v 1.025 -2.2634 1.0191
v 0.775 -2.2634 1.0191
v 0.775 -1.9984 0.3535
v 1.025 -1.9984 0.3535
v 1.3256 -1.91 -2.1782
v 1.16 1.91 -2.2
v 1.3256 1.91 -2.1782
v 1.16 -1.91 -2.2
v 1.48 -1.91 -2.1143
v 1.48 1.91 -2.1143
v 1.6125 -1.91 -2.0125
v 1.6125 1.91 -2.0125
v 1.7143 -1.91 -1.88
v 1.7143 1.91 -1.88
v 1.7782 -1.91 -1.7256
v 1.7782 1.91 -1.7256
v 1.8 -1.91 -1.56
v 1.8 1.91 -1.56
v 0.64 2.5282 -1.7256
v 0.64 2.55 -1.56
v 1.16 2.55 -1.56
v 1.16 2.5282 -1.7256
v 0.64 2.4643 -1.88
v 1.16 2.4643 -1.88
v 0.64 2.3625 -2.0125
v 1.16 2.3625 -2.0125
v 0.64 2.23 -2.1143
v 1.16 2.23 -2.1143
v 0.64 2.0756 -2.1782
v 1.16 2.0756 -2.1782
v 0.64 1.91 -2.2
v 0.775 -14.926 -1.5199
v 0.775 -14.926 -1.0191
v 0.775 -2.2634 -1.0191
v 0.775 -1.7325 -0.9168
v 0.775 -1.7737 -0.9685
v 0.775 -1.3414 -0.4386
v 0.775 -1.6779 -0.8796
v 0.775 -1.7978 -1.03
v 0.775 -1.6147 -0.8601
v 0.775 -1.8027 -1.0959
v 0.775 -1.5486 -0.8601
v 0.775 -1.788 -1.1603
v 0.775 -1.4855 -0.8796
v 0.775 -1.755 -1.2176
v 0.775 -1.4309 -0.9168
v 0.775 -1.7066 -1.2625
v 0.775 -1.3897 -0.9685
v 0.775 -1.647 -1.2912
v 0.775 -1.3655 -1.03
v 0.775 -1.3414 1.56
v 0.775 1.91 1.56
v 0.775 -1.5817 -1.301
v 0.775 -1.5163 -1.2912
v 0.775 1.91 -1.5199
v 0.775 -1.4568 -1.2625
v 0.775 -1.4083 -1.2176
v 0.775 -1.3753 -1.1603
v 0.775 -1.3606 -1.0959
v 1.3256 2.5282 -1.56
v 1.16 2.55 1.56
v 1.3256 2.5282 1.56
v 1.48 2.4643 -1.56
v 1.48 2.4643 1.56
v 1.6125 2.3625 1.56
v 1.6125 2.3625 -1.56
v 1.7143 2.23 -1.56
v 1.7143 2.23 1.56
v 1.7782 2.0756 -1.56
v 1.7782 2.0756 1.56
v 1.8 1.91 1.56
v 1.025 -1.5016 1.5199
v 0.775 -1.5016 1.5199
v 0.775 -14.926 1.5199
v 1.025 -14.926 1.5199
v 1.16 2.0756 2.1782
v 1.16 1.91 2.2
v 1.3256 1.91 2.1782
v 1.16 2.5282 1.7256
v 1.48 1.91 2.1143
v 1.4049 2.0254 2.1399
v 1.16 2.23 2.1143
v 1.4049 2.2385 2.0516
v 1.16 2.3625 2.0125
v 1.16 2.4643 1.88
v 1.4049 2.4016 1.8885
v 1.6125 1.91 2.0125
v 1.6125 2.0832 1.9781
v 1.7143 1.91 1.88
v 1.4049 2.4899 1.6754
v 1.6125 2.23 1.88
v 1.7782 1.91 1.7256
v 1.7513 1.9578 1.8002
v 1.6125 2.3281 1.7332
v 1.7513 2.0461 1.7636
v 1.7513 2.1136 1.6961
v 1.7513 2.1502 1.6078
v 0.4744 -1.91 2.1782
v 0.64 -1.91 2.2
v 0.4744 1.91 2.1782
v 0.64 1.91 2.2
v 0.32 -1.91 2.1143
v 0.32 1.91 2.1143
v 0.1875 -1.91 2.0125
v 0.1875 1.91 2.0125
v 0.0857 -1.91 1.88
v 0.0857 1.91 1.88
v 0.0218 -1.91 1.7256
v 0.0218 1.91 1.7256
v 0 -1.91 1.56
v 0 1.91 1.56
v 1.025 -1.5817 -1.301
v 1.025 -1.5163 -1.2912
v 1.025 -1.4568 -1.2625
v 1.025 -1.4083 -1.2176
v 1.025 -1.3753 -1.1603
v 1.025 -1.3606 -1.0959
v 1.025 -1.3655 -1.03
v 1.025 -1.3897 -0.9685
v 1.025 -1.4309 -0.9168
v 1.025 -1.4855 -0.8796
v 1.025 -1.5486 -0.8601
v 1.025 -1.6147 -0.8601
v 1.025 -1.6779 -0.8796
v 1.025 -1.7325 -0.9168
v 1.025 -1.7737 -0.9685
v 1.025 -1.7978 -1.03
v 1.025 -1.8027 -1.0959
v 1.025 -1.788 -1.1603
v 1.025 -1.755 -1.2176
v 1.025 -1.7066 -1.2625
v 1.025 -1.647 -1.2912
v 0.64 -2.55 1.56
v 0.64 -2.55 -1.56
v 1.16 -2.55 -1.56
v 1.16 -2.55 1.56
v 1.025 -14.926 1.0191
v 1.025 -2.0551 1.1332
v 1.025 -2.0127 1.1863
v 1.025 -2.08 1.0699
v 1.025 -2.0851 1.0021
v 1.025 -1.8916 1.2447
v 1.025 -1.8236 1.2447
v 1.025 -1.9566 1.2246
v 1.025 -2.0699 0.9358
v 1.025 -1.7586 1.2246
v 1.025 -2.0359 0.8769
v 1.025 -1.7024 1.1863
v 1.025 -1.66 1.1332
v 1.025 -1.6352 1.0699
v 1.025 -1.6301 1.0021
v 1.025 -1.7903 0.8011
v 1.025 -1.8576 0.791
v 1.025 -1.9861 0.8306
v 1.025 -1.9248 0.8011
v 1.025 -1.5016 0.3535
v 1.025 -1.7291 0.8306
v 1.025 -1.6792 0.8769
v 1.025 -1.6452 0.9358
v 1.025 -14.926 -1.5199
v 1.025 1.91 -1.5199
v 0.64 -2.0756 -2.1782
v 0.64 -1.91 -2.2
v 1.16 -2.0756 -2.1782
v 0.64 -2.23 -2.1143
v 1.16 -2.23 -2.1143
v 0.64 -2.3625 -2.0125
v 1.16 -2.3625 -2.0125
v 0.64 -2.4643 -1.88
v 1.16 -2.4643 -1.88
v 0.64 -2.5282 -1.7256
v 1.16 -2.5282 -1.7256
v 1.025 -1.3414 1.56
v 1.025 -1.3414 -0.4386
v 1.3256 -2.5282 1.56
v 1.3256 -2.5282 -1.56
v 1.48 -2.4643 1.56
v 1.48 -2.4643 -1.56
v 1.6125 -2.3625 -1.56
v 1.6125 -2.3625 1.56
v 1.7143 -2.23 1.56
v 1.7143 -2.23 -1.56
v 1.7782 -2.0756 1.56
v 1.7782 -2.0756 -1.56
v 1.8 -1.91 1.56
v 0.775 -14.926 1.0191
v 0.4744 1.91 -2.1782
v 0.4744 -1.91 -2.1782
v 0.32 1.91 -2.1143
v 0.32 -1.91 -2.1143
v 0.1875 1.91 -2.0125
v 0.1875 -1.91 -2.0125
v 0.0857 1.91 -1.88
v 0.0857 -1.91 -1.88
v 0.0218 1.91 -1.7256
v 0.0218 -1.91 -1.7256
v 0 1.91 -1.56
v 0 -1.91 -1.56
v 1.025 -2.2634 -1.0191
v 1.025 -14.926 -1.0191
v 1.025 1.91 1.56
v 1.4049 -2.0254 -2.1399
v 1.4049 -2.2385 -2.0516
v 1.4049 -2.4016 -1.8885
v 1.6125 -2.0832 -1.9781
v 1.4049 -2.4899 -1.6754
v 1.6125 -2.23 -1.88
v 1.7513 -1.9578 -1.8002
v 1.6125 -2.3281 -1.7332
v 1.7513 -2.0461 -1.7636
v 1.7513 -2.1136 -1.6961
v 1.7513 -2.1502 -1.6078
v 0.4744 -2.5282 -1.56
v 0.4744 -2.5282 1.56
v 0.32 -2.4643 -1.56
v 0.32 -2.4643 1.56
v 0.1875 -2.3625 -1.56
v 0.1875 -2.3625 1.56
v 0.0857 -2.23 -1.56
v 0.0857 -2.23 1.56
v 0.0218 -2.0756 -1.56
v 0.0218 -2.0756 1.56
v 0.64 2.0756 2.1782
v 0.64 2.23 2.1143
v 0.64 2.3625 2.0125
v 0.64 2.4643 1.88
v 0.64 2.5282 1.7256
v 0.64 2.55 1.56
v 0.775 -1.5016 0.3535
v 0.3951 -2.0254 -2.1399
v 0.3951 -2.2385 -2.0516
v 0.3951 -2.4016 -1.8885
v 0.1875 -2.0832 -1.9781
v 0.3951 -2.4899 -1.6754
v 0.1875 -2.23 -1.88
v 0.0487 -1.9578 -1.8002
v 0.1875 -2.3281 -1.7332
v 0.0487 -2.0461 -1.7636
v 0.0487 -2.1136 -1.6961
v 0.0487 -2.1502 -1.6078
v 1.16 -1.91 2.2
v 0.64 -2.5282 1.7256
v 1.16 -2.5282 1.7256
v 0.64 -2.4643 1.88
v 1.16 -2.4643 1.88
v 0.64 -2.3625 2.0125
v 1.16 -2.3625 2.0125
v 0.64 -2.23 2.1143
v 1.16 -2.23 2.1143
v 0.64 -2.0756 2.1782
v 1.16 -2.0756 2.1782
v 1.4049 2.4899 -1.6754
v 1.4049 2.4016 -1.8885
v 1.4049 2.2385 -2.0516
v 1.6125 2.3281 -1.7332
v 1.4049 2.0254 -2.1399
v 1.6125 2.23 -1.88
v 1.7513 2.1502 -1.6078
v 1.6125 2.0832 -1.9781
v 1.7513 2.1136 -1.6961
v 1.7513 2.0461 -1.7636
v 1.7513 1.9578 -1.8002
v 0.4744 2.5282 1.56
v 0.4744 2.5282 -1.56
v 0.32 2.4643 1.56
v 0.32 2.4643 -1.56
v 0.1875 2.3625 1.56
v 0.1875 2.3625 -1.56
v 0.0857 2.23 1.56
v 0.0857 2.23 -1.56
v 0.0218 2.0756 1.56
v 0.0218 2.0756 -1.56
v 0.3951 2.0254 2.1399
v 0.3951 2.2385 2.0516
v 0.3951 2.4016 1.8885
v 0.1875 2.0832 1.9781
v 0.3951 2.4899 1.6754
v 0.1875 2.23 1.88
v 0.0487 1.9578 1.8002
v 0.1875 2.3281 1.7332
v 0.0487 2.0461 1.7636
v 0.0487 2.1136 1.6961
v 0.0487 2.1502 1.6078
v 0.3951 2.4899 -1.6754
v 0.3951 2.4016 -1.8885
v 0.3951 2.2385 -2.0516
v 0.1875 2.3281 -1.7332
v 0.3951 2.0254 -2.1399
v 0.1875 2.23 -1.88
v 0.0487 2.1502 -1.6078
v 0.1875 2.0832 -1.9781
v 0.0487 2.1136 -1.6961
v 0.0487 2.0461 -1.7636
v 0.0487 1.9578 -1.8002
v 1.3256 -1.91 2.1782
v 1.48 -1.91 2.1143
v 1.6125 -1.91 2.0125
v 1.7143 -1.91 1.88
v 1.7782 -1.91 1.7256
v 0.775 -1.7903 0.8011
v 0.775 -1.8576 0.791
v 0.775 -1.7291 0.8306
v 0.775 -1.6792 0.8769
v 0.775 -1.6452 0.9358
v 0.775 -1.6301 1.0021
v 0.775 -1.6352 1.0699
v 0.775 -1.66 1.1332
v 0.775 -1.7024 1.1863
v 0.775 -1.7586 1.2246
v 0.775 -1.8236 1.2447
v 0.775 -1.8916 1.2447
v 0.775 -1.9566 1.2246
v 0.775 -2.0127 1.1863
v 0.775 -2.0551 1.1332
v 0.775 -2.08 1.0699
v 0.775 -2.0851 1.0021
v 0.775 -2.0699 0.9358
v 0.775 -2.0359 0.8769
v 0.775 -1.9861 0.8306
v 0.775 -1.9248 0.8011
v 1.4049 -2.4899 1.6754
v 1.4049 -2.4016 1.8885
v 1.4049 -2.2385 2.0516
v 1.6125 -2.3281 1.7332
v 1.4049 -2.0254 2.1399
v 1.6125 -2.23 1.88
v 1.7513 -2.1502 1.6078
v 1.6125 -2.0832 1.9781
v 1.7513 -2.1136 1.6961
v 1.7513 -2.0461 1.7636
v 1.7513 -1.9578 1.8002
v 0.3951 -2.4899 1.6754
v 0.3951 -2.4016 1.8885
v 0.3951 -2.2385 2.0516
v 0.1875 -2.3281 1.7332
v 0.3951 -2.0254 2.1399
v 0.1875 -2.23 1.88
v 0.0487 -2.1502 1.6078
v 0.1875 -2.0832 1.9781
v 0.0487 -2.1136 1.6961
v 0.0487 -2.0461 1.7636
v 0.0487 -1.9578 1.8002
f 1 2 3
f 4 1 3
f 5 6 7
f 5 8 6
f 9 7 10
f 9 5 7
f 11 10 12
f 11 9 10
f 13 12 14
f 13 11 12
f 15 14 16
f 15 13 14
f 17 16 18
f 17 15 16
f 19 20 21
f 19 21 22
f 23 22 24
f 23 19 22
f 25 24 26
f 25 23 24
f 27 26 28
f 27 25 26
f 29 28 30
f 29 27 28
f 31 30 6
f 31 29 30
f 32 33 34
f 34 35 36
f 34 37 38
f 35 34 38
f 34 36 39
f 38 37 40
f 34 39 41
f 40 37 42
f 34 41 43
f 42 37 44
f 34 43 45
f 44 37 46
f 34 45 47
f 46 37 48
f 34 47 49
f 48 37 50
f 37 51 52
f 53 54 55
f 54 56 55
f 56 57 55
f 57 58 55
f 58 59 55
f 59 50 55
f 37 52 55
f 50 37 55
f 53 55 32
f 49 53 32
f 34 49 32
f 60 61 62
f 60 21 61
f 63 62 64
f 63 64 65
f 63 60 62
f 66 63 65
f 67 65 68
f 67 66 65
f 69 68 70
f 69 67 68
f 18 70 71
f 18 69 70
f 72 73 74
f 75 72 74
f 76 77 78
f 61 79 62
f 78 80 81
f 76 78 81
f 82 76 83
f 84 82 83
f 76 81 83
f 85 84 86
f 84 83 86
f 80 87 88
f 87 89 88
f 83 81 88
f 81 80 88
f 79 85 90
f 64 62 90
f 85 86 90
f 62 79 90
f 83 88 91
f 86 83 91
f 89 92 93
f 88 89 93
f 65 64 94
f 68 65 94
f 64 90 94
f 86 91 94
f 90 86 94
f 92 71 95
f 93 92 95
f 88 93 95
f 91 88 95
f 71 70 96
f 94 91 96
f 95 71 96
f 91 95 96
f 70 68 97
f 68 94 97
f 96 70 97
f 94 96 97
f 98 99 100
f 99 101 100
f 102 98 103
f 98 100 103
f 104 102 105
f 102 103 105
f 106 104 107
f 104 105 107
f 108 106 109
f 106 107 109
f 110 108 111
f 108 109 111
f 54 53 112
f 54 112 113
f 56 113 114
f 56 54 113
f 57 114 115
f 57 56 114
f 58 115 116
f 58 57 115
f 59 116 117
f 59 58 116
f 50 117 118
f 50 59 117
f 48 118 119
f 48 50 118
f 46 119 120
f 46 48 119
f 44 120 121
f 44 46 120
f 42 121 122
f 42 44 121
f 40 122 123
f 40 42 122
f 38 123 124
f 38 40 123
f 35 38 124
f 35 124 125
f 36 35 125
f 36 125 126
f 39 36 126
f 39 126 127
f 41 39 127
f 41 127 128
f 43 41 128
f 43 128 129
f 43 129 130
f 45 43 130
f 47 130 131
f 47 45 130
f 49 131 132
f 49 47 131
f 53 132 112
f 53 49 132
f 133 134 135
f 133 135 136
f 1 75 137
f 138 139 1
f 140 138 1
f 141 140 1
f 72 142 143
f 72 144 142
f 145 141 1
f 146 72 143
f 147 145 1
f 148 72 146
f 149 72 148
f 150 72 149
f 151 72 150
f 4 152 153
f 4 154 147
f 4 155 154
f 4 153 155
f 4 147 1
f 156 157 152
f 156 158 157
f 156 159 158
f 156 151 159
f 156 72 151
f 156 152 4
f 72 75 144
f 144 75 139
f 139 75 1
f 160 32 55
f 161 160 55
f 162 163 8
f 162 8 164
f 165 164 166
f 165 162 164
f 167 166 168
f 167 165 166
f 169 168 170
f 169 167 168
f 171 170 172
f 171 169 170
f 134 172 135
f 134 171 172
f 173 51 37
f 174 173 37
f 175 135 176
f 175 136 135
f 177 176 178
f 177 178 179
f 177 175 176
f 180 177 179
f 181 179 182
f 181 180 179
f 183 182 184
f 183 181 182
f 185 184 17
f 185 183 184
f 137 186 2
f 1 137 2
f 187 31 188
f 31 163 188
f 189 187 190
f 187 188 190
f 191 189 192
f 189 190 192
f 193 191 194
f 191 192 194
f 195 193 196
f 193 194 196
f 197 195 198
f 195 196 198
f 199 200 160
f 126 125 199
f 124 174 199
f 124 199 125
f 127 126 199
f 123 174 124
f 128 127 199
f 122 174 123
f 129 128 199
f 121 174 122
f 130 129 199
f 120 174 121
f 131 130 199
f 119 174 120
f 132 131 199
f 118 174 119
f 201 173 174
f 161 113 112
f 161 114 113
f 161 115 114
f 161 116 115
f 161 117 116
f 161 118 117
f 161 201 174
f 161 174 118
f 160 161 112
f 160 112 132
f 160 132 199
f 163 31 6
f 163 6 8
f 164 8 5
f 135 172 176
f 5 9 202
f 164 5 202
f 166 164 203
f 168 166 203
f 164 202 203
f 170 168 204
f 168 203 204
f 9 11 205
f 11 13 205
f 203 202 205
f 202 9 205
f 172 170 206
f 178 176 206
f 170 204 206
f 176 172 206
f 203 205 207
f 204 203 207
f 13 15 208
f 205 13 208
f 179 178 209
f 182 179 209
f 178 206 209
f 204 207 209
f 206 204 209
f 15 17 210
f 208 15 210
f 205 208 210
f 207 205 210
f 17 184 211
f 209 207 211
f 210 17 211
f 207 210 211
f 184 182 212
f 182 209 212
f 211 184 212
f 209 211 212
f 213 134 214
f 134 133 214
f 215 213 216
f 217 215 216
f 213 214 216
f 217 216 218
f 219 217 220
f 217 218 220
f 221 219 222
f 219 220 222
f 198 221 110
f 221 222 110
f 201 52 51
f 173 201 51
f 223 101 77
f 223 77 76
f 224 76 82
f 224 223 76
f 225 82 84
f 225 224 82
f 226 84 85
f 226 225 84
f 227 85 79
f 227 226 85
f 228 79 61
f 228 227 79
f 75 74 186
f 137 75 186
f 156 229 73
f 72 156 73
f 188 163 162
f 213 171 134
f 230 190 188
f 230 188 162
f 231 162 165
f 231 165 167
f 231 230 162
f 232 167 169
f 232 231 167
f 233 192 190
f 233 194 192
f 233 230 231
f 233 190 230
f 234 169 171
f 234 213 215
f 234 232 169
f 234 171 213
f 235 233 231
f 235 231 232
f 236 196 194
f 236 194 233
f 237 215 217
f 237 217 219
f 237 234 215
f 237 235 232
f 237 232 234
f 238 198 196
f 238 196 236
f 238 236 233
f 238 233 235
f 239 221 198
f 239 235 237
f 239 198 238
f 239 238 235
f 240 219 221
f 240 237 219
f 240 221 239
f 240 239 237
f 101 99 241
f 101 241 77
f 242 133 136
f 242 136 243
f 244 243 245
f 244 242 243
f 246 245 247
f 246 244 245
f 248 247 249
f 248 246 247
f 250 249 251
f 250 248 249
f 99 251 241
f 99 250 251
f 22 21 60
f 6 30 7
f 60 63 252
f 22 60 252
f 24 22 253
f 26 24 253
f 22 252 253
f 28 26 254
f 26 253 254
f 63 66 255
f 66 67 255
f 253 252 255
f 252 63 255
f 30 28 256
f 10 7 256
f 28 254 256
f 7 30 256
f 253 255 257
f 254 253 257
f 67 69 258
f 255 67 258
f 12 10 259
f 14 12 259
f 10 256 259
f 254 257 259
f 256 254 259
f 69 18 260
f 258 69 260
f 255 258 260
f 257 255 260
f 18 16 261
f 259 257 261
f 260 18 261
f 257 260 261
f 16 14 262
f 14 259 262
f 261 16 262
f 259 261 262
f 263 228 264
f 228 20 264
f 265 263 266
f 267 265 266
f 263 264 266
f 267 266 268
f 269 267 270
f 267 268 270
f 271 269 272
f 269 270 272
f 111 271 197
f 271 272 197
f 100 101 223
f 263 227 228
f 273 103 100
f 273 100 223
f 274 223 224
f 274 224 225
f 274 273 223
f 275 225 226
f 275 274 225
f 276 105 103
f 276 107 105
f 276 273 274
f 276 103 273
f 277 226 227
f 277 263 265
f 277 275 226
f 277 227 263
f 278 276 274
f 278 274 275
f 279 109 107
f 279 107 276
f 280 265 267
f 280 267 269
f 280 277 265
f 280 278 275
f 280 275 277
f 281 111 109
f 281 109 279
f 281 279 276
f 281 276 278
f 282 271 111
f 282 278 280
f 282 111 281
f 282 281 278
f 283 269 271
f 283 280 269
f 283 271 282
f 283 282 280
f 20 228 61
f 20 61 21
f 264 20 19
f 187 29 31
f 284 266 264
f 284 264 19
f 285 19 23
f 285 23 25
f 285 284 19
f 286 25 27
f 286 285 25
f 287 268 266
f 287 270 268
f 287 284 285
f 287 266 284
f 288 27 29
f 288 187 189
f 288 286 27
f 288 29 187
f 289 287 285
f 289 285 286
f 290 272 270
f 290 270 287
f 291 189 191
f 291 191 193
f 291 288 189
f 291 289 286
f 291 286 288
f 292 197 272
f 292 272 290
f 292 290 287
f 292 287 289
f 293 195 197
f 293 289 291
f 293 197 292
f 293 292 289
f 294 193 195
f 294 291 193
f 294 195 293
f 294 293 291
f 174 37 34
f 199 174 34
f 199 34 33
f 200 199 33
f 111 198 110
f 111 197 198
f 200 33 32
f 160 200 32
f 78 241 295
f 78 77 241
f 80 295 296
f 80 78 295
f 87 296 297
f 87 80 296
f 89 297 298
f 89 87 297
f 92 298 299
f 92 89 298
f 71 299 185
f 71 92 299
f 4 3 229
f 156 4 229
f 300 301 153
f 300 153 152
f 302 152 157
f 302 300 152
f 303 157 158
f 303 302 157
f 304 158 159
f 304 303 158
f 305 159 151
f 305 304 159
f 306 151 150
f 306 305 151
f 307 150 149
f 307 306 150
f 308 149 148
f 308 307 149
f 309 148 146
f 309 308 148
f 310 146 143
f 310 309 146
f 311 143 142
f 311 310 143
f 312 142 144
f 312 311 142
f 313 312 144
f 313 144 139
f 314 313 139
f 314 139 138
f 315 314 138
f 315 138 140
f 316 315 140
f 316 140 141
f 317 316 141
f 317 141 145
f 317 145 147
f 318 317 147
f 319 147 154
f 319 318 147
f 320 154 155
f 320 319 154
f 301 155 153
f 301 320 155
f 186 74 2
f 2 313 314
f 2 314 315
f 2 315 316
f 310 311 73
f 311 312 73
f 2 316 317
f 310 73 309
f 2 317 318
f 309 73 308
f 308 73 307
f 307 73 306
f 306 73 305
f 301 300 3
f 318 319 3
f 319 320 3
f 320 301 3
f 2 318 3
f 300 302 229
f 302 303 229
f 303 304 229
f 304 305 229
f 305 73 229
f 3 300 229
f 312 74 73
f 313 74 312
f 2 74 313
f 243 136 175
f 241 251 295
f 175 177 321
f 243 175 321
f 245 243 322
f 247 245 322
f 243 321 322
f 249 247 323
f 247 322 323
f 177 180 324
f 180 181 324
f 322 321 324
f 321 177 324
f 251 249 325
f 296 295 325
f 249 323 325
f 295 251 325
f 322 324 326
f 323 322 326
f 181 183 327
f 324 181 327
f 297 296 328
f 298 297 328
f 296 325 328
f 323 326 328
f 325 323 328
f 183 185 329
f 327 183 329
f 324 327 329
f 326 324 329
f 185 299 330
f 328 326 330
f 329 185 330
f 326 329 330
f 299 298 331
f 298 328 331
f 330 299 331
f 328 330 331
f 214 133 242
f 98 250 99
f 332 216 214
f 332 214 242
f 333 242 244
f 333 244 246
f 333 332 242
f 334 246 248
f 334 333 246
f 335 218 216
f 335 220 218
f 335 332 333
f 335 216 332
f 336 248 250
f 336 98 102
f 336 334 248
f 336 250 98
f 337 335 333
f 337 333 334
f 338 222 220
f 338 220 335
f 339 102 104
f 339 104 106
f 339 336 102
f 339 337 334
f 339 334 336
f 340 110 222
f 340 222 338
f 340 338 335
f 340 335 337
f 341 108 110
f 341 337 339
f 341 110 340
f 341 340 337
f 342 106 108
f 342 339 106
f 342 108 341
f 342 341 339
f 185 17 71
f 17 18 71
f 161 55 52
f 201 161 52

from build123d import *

# Parameters (mm, degrees)
BOSS_EXTRUDE1_DEPTH        = 1.8
FILLET1_R                  = 0.64
BOSS_EXTRUDE2_DEPTH        = 0.125
BOSS_EXTRUDE2_DEPTH_BACK   = 0.125
SKETCH2_R                  = 0.221694952
BOSS_EXTRUDE2_2_DEPTH      = 0.125
BOSS_EXTRUDE2_2_DEPTH_BACK = 0.125
SKETCH2_R_2                = 0.228124389


with BuildPart() as part:
    # Sketch1 → Boss-Extrude1 (new body)
    with BuildSketch(Plane(origin=(0, 0, 0), x_dir=(0, 0, -1), z_dir=(1, 0, 0))):
        with BuildLine():
            Line((-1.56, 2.55), (1.56, 2.55))
            ThreePointArc((1.56, 2.55), (2.01254834, 2.36254834), (2.2, 1.91))
            Line((2.2, 1.91), (2.2, -1.91))
            ThreePointArc((2.2, -1.91), (2.01254834, -2.36254834), (1.56, -2.55))
            Line((1.56, -2.55), (-1.56, -2.55))
            ThreePointArc((-1.56, -2.55), (-2.01254834, -2.36254834), (-2.2, -1.91))
            Line((-2.2, -1.91), (-2.2, 1.91))
            ThreePointArc((-2.2, 1.91), (-2.01254834, 2.36254834), (-1.56, 2.55))
        make_face()
    extrude(amount=BOSS_EXTRUDE1_DEPTH)

    # Fillet1
    fillet1_edges = [part.edges().sort_by_distance(p)[0] for p in [
        (1.8, -2.36254834, -2.01254834),
        (0, -2.55, 0),
        (0, -2.36254834, 2.01254834),
        (1.8, 0, -2.2),
        (1.8, 2.36254834, -2.01254834),
        (1.8, 2.55, 0),
        (1.8, 2.36254834, 2.01254834),
        (1.8, 0, 2.2),
        (1.8, -2.36254834, 2.01254834),
        (1.8, -2.55, 0),
        (0, 0, 2.2),
        (0, 2.36254834, 2.01254834),
        (0, 2.55, 0),
        (0, 2.36254834, -2.01254834),
        (0, 0, -2.2),
        (0, -2.36254834, -2.01254834),
    ]]
    fillet(fillet1_edges, radius=FILLET1_R)


with BuildPart() as body_2:
    # Sketch2 → Boss-Extrude2 (new, two sides: drawn at the far end of the back side and taken through both)
    with BuildSketch(Plane(origin=(0.9, 0, 0), x_dir=(0, 0, -1), z_dir=(1, 0, 0)).offset(-BOSS_EXTRUDE2_DEPTH_BACK)):
        Polygon((1.019106057, -14.926003362), (1.519901832, -14.926003362), (1.519901832, -10.343869193), (1.519901832, -1.501575177), (1.519901832, 1.91), (-1.56, 1.91), (-1.56, -1.341377057), (0.438562537, -1.341377057), (1.019106057, -2.263381464), align=None)
        with Locations((1.079355018, -1.581674238)):
            Circle(SKETCH2_R, mode=Mode.SUBTRACT)
    extrude(amount=BOSS_EXTRUDE2_DEPTH + BOSS_EXTRUDE2_DEPTH_BACK)


with BuildPart() as body_3:
    # Sketch2 → Boss-Extrude2 2 (new, two sides: drawn at the far end of the back side and taken through both)
    with BuildSketch(Plane(origin=(0.9, 0, 0), x_dir=(0, 0, -1), z_dir=(1, 0, 0)).offset(-BOSS_EXTRUDE2_2_DEPTH_BACK)):
        Polygon((-1.019106057, -2.263381464), (-0.353528169, -1.998409357), (-0.353528169, -1.501575177), (-1.519901832, -1.501575177), (-1.519901832, -10.343869193), (-1.519901832, -14.926003362), (-1.019106057, -14.926003362), align=None)
        with Locations((-1.019106057, -1.857571)):
            Circle(SKETCH2_R_2, mode=Mode.SUBTRACT)
    extrude(amount=BOSS_EXTRUDE2_2_DEPTH + BOSS_EXTRUDE2_2_DEPTH_BACK)


solid = Compound([part.part, body_2.part, body_3.part])
